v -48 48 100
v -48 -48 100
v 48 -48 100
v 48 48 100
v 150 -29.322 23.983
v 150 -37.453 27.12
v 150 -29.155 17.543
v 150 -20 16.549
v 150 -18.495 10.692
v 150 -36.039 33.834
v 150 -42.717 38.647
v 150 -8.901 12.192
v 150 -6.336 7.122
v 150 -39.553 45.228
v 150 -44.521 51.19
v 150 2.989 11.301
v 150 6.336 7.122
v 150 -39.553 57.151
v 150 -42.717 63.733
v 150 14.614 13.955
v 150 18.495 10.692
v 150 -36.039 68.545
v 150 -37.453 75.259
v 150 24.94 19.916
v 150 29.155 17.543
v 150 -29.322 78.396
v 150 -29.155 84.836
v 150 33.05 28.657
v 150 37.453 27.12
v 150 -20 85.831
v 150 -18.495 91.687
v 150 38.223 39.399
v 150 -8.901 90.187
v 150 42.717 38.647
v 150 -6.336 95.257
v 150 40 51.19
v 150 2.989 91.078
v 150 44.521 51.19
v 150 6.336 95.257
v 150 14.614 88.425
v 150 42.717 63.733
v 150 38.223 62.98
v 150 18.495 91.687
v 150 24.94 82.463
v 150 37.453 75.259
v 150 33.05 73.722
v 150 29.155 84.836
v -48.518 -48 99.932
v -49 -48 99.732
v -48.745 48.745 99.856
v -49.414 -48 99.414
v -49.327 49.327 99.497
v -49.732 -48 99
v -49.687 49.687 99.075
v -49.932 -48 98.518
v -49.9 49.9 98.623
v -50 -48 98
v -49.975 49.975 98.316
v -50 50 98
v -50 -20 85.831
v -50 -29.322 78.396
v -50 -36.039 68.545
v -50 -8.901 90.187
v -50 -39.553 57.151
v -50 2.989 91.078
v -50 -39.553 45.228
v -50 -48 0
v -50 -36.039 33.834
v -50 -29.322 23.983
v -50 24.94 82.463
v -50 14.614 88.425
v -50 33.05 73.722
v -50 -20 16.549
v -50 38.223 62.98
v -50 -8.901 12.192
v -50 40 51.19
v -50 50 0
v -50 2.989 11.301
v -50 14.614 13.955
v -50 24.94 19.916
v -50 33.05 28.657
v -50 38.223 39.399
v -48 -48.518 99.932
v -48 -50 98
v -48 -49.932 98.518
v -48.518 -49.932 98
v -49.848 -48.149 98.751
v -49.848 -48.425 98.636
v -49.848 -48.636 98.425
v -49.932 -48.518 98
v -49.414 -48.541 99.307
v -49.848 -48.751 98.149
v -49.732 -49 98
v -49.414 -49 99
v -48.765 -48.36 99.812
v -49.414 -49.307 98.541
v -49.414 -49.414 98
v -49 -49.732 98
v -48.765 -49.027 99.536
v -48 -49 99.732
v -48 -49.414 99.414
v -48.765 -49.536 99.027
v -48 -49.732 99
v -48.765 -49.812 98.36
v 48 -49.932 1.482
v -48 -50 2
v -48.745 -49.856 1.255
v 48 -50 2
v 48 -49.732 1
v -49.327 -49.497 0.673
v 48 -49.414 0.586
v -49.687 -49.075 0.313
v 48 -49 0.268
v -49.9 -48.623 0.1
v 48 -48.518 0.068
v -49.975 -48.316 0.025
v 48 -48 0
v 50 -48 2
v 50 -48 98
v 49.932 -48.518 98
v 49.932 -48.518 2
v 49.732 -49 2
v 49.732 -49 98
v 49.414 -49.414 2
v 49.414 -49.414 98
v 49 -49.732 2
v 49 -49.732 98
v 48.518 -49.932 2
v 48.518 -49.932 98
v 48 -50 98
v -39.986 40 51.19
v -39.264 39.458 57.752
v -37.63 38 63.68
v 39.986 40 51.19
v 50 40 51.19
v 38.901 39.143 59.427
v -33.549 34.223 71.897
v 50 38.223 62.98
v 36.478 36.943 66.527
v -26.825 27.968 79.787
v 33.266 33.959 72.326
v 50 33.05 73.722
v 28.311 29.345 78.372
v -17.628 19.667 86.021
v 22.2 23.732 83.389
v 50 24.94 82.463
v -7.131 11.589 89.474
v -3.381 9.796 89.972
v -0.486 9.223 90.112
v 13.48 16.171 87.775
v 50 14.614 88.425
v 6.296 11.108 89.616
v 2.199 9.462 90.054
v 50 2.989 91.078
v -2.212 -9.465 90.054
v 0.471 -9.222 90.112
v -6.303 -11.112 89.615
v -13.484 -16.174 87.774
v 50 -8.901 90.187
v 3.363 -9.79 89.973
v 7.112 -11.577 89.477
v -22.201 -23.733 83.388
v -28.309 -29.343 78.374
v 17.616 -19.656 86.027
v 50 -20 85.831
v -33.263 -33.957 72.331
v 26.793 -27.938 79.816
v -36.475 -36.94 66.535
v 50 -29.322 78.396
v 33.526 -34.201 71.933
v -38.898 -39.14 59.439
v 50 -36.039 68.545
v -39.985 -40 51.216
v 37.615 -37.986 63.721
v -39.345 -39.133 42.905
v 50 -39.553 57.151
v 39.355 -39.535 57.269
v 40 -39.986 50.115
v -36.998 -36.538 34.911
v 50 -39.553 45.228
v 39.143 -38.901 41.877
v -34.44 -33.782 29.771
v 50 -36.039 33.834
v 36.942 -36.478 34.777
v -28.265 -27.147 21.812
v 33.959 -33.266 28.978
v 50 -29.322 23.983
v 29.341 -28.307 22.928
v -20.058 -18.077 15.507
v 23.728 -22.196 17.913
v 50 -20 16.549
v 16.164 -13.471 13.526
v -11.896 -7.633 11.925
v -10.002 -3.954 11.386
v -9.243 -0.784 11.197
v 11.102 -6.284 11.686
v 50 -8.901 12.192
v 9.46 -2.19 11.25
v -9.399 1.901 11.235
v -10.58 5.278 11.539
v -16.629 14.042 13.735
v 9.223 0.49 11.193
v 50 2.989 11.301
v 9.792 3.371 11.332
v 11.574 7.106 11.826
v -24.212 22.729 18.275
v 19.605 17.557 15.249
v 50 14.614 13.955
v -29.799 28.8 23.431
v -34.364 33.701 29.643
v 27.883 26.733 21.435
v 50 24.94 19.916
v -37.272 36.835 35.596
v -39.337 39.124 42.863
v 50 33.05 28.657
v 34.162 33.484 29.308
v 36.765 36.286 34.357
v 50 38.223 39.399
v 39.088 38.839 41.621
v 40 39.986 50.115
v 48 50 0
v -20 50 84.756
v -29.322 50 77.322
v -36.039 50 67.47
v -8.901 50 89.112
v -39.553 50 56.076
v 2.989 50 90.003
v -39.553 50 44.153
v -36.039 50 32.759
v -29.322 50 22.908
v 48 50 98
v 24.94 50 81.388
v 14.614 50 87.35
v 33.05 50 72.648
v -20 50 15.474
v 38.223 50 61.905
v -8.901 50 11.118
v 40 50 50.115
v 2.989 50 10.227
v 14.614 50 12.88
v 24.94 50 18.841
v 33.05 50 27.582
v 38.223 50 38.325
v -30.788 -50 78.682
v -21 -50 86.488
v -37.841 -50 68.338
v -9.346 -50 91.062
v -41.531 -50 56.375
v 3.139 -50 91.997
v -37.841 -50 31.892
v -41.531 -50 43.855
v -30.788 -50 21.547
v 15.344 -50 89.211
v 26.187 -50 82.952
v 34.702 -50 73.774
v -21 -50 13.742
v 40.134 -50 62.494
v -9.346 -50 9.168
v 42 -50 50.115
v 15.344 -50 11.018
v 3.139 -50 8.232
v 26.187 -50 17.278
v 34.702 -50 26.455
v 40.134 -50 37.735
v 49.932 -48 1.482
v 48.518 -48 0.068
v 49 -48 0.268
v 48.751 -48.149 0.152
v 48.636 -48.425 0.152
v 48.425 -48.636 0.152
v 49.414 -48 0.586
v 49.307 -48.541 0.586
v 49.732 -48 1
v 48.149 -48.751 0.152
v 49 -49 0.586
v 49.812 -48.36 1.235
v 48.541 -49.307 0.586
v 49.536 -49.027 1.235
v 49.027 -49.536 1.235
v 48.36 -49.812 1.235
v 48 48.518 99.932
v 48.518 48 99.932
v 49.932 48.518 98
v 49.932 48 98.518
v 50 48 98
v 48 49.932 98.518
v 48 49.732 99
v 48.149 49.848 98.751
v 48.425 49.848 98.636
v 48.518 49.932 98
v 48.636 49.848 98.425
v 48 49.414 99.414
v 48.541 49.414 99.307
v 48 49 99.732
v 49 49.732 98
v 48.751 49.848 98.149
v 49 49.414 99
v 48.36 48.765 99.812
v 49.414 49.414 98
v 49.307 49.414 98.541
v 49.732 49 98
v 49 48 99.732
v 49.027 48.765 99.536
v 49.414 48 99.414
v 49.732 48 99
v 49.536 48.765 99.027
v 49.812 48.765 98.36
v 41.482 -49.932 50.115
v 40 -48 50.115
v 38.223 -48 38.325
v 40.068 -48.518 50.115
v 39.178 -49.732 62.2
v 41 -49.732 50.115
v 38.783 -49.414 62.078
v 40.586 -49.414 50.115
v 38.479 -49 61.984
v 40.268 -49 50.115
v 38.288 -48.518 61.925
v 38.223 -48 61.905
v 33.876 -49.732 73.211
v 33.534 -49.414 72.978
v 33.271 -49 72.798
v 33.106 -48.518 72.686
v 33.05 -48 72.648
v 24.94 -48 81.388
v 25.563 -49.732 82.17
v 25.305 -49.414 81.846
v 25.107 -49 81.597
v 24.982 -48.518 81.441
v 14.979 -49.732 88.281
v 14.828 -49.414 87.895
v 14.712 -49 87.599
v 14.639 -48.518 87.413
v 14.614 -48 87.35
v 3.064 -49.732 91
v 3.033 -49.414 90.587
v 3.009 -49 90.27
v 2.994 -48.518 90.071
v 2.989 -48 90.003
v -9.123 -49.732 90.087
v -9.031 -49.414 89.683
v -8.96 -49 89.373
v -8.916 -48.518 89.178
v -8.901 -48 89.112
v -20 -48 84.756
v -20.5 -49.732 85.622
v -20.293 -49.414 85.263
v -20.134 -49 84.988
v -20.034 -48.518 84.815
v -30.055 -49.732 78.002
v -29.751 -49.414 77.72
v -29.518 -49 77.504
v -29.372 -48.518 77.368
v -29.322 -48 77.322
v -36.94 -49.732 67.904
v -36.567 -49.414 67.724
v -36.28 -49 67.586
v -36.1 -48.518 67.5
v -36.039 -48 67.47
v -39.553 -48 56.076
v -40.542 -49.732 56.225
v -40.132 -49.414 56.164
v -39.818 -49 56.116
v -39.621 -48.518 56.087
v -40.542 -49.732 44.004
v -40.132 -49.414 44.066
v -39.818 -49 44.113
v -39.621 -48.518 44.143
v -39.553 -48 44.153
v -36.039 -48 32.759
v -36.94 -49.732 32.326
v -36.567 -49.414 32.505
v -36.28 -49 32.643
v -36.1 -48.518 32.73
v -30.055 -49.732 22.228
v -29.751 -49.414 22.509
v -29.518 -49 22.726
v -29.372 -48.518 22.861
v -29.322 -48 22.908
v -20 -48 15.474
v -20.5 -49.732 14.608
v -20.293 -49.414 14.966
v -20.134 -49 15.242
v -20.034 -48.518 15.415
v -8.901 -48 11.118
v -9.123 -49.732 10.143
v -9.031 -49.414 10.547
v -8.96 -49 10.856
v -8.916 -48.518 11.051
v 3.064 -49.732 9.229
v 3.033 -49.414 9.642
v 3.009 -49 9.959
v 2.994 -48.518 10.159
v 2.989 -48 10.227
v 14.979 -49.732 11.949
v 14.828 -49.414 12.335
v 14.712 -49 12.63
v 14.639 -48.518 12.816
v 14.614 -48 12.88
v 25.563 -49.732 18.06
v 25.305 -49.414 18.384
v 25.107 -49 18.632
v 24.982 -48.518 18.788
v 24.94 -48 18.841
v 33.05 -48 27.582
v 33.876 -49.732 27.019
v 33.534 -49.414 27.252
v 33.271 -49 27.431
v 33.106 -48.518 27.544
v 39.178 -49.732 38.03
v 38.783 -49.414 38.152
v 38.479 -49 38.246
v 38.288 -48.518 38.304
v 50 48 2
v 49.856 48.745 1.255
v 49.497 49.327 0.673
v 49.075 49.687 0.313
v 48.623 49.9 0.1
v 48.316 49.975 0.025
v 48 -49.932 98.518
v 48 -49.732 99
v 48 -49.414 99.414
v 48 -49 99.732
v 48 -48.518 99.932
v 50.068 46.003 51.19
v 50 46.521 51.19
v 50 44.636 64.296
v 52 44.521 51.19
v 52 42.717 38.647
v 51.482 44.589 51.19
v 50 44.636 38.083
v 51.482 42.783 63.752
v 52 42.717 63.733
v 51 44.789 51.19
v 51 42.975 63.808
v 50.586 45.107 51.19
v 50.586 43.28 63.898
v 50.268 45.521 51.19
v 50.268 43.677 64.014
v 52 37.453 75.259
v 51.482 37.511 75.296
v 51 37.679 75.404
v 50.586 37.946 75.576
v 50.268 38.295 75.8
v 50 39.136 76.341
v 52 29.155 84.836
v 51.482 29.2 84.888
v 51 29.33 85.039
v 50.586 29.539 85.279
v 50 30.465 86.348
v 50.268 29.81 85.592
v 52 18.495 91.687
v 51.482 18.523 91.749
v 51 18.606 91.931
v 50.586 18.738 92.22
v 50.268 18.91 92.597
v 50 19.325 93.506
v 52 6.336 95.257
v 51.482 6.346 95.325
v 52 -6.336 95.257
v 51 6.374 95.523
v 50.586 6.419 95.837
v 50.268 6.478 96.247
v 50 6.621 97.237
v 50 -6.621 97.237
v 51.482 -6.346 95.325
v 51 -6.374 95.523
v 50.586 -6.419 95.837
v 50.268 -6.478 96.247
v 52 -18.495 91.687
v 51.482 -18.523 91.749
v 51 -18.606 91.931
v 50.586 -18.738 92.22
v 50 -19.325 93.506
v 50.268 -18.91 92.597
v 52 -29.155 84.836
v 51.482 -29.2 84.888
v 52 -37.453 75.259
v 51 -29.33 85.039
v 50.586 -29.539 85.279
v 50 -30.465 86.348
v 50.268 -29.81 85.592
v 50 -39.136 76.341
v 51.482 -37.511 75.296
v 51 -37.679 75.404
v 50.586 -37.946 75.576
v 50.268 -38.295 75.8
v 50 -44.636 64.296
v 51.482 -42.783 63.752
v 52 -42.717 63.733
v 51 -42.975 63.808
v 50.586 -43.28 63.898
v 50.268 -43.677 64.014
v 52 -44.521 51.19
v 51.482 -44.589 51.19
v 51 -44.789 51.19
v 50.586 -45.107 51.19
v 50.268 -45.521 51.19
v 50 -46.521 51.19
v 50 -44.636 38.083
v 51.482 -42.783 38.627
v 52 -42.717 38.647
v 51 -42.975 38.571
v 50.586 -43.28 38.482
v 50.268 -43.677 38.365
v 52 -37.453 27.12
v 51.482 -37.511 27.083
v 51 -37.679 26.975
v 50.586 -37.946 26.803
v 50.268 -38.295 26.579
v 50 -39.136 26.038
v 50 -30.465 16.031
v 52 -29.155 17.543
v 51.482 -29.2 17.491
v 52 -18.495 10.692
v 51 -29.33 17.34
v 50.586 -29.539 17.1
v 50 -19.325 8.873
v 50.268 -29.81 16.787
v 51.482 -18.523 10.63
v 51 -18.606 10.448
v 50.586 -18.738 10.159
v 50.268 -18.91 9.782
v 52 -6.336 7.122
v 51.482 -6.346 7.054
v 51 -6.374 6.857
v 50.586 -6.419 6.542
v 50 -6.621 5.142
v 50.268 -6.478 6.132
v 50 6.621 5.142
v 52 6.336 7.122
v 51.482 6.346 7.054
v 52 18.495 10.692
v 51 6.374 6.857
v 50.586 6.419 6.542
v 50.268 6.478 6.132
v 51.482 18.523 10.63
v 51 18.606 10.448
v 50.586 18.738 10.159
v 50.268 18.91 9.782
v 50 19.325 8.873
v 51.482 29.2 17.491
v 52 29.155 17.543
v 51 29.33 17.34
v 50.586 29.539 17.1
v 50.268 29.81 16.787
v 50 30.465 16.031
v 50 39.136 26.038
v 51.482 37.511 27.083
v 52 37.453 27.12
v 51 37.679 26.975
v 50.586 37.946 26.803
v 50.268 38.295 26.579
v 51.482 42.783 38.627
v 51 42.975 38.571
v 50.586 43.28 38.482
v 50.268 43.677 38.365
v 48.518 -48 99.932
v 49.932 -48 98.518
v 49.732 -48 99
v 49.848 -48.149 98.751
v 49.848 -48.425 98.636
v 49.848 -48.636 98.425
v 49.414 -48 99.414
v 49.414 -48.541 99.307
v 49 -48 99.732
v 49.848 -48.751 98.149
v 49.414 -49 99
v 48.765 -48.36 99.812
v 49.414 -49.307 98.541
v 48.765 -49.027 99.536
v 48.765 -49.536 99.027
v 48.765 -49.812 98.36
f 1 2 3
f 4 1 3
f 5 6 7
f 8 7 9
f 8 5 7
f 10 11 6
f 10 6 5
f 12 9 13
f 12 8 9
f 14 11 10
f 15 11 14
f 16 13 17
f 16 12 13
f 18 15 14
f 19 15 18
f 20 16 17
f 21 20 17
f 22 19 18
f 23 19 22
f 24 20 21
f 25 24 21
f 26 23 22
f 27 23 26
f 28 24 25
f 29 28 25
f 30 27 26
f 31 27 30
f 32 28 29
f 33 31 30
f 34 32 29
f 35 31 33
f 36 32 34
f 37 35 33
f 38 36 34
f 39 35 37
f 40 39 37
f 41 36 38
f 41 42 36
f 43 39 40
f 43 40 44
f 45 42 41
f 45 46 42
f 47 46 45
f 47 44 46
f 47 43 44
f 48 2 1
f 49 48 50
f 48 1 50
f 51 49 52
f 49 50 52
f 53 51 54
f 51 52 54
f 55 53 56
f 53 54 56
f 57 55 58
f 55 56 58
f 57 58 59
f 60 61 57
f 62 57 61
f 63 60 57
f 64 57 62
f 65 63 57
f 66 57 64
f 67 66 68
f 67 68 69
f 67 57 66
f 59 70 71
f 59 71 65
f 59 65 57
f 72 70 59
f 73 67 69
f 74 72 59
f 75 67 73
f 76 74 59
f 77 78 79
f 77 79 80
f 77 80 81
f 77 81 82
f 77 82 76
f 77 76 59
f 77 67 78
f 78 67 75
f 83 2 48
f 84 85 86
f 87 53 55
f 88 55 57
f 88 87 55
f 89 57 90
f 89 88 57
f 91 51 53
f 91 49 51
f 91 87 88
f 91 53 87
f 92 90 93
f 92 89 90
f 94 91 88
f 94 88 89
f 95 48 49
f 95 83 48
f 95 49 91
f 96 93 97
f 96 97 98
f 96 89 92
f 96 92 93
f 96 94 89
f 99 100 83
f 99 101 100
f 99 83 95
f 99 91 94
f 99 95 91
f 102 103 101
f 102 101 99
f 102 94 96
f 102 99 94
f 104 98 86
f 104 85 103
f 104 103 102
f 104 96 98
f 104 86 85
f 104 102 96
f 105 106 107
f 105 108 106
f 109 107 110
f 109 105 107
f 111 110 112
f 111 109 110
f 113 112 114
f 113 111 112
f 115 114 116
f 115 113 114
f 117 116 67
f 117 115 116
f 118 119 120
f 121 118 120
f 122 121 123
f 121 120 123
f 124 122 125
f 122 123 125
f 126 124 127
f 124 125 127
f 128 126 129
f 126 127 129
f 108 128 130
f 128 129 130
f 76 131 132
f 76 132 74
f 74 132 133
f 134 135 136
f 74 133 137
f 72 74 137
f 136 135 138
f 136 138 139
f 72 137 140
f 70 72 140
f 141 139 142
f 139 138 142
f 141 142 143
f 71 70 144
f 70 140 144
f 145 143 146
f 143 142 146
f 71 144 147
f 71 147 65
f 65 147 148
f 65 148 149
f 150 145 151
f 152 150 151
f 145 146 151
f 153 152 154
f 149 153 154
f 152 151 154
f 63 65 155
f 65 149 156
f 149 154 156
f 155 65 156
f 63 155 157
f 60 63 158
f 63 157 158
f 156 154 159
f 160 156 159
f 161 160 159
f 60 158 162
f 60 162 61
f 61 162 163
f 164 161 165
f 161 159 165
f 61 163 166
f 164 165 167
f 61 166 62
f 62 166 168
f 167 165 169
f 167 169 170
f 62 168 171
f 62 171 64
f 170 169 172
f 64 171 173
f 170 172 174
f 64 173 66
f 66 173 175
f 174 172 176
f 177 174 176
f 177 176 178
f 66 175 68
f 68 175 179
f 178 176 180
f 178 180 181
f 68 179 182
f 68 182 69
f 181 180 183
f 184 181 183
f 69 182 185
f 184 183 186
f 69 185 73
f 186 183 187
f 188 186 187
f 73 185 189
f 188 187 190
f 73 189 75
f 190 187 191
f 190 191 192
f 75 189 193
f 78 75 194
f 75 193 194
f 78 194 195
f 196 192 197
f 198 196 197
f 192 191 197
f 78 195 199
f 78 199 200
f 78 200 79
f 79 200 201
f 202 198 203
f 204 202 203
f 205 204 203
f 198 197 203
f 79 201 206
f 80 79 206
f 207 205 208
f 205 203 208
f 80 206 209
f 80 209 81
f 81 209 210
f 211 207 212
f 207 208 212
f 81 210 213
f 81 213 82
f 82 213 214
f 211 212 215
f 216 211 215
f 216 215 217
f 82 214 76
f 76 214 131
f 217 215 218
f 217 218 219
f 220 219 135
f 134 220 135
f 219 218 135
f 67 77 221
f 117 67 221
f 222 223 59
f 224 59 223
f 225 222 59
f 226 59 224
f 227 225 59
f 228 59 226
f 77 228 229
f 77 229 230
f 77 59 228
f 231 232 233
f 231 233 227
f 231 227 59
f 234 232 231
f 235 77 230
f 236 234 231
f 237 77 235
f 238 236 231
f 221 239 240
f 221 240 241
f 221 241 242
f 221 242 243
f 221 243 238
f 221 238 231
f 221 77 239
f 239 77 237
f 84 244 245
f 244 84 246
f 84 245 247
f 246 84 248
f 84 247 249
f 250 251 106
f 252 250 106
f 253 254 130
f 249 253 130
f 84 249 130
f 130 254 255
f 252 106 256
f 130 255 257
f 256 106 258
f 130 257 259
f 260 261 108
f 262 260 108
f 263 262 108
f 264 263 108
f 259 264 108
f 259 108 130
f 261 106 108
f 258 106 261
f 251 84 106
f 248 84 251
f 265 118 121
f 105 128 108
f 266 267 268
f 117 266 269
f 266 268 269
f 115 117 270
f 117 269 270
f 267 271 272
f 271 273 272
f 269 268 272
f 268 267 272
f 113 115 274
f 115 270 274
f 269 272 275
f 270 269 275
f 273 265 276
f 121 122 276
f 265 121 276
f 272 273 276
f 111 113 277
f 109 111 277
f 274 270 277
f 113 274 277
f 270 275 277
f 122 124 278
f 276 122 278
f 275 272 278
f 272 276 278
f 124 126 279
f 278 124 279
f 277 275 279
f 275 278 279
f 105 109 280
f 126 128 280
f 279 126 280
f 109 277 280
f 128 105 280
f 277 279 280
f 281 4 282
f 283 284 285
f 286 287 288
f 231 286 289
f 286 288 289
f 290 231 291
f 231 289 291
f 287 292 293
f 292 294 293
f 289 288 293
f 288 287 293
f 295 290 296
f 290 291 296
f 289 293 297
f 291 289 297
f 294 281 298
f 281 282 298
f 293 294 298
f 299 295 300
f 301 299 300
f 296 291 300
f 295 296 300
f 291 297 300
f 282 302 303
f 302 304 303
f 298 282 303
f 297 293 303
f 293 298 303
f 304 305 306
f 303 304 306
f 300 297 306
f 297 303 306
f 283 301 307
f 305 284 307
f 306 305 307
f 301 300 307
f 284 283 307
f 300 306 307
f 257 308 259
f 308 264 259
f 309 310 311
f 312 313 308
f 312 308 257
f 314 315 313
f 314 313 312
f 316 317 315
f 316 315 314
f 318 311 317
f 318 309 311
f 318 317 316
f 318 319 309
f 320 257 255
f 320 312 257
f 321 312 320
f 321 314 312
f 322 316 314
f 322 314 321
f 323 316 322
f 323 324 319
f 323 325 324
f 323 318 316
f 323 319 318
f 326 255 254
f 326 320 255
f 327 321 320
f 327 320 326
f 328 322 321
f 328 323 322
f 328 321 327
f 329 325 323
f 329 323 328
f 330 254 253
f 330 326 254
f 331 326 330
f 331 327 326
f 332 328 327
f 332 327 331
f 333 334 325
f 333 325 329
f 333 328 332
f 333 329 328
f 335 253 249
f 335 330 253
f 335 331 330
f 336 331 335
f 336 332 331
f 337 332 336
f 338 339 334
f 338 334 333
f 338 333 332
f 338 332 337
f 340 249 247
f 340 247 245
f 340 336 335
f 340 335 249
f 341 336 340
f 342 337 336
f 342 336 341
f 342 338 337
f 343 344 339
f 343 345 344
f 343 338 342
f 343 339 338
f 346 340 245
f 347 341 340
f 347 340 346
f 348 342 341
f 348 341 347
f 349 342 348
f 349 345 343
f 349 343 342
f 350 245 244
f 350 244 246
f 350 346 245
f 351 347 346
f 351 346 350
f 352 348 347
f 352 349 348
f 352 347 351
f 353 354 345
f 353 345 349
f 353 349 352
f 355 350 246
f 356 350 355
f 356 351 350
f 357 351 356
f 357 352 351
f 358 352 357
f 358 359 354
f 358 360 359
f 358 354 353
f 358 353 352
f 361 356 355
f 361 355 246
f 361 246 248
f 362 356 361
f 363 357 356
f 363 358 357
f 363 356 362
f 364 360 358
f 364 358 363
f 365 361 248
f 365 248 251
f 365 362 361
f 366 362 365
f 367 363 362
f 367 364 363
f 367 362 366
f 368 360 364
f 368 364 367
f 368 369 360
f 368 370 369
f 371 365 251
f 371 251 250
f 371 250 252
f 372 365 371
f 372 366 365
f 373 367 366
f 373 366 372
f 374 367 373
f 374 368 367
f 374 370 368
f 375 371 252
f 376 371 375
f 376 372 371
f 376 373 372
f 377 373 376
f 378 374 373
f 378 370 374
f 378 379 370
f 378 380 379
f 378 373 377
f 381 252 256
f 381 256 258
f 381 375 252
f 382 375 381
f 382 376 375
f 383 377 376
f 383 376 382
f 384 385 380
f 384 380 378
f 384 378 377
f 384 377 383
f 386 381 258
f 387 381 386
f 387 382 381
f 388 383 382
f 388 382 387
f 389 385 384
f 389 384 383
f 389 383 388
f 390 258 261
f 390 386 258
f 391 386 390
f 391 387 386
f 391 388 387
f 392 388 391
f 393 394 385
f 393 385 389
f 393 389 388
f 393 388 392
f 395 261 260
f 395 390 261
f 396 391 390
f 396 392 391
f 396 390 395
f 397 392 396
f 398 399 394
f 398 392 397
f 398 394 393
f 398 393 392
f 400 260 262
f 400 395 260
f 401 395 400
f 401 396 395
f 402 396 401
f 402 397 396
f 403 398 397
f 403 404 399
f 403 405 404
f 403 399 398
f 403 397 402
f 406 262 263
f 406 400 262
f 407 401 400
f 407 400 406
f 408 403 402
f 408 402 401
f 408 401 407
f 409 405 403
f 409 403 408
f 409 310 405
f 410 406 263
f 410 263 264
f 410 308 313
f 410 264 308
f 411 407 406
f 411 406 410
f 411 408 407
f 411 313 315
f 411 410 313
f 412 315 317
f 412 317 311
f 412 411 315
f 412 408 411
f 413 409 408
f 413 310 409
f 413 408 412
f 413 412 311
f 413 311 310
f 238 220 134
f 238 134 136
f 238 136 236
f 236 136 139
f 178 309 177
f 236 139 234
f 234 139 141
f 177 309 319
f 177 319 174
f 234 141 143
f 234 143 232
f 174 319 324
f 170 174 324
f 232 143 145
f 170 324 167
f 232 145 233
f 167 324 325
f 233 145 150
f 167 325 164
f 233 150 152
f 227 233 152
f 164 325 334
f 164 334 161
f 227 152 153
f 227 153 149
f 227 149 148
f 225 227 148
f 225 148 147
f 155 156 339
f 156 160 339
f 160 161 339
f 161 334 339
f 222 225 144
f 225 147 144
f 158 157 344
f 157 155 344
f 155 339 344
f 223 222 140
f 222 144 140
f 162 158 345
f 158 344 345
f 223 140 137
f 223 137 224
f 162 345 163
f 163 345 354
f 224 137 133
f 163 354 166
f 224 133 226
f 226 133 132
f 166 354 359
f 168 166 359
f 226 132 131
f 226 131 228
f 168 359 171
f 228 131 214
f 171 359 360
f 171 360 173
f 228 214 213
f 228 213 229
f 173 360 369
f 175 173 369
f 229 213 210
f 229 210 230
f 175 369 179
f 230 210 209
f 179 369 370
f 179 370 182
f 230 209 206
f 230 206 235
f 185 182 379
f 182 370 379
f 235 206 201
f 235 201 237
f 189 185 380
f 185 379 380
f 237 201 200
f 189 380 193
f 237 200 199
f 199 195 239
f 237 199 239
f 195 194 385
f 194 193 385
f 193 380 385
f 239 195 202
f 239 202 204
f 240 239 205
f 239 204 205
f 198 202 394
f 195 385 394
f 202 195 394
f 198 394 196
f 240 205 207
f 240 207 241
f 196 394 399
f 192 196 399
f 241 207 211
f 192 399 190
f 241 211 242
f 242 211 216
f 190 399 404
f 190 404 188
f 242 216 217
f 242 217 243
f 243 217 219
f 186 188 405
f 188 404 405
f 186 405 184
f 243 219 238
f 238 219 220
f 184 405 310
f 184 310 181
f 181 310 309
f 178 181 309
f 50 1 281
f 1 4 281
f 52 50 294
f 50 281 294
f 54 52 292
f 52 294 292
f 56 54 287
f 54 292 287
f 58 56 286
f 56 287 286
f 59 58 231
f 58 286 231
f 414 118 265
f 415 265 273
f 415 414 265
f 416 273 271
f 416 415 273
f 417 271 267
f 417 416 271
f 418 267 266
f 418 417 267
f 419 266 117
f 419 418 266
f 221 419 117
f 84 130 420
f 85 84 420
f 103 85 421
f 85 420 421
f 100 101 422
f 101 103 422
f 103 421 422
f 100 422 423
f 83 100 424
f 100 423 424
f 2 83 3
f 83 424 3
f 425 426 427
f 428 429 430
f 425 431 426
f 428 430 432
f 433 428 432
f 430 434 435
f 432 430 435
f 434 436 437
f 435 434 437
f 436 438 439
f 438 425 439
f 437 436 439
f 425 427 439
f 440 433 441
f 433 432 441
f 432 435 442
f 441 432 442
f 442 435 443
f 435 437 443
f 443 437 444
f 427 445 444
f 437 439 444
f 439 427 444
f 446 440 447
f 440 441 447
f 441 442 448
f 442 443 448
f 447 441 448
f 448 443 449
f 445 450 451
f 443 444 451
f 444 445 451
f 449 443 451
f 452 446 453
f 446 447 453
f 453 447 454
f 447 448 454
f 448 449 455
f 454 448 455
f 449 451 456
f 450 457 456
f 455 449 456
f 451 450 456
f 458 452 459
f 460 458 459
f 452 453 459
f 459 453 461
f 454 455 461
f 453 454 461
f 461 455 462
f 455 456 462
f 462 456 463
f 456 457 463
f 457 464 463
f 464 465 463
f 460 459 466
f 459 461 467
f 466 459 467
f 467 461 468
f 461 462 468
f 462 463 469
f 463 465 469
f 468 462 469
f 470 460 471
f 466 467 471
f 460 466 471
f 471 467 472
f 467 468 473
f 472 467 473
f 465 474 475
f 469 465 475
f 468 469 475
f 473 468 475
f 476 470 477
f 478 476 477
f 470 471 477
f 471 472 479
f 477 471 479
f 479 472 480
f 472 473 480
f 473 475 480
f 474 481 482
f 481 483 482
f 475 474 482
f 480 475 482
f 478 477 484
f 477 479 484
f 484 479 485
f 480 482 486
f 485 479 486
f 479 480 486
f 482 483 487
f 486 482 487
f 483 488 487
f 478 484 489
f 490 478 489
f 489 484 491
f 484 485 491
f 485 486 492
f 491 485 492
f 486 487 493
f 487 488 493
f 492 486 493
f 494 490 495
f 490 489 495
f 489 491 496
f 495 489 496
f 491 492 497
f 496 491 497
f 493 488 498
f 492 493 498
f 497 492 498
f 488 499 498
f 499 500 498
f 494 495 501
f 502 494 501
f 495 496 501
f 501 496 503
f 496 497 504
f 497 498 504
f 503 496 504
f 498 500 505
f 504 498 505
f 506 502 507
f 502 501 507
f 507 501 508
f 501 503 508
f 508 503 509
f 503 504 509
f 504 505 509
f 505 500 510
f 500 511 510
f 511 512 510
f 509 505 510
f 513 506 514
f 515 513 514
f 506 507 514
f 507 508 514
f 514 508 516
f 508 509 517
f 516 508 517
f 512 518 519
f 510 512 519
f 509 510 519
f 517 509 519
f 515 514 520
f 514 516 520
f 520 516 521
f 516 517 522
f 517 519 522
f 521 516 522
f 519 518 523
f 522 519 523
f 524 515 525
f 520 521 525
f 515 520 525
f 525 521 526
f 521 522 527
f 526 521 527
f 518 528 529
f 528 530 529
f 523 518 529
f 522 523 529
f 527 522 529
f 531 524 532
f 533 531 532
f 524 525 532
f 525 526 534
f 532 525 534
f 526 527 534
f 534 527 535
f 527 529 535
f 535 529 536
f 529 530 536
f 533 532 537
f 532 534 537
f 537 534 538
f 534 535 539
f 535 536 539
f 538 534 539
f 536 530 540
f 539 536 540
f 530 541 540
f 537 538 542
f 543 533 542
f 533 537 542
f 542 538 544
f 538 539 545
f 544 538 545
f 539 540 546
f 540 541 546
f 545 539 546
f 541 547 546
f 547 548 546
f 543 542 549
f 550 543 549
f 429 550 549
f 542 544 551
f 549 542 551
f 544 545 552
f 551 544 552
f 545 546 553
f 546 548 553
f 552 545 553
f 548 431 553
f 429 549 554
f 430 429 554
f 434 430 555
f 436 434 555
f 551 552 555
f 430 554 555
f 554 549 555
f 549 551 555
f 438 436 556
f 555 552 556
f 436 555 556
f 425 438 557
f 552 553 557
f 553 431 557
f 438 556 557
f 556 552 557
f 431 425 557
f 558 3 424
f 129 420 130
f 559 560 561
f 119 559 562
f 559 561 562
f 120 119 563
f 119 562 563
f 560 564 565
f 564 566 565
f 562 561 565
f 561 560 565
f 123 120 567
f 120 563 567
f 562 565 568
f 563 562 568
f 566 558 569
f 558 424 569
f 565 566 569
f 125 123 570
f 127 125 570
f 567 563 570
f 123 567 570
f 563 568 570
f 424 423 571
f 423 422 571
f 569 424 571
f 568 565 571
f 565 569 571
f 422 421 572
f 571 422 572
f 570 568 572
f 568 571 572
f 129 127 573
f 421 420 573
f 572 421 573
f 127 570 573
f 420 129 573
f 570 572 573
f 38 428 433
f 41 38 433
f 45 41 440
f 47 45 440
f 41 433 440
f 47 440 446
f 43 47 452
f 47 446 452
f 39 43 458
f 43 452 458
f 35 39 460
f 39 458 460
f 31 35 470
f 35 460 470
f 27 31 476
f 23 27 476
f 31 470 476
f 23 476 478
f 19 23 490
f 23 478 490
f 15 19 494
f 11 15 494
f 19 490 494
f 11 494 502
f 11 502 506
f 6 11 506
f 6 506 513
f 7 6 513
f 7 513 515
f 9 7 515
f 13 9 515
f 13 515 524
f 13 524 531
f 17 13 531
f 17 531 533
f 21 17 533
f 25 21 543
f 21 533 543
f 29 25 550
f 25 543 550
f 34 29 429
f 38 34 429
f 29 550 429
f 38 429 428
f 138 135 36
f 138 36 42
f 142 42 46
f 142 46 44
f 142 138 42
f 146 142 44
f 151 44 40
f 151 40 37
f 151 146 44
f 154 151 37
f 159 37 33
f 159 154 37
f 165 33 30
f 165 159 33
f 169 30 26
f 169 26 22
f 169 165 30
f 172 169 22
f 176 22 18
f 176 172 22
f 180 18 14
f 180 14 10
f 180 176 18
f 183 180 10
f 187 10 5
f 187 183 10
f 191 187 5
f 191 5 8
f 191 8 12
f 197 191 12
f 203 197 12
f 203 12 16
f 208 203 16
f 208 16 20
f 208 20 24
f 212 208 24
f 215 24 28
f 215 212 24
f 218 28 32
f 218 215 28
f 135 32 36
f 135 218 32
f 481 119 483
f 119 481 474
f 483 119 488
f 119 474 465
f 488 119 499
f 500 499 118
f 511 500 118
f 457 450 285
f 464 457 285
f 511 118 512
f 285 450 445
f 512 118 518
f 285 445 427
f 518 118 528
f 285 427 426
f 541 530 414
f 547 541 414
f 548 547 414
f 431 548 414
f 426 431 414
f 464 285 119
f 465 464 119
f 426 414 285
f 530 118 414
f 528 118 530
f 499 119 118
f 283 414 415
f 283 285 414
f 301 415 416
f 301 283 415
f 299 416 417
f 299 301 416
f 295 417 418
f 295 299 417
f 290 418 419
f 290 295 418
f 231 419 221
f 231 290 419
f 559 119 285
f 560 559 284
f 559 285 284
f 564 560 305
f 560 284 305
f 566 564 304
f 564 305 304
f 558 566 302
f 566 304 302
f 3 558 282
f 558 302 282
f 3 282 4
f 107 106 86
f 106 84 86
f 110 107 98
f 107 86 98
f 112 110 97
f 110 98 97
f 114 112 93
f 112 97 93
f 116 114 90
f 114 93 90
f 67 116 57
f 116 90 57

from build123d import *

# Parameters (mm, degrees)
F0_W     = 100
F0_H     = 100
F1_DEPTH = 100
F2_R     = 40
F3_DEPTH = 100.001
F4_R     = 40
F5_DEPTH = 100.001
F2_R_2   = 44.5208759626
F6_DEPTH = 100
F7_R     = 2


with BuildPart() as f1:
    # F0 (on Top) → F1 (new body)
    with BuildSketch(Plane.XY):
        Rectangle(F0_W, F0_H)
    extrude(amount=F1_DEPTH)

    # F2 (on face) → F3 (cut, through all)
    with BuildSketch(Plane.YZ.offset(50)):
        with Locations((0, 51.1895758084)):
            Circle(F2_R)
    extrude(amount=-F3_DEPTH, mode=Mode.SUBTRACT)

    # F4 (on face) → F5 (cut, through all)
    with BuildSketch(Plane.XZ.offset(50)):
        with Locations((0, 50.114749205)):
            Circle(F4_R)
    extrude(amount=-F5_DEPTH, mode=Mode.SUBTRACT)

    # F2 (on face) → F6 (join)
    with BuildSketch(Plane.YZ.offset(50)):
        with Locations((0, 51.1895758084)):
            Circle(F2_R_2)
        with Locations((0, 51.1895758084)):
            Circle(F2_R, mode=Mode.SUBTRACT)
    extrude(amount=F6_DEPTH)

    # F7
    f7_edges = [f1.edges().sort_by_distance(p)[0] for p in [
        (0, -50, 100),
        (50, 0, 100),
        (0, 50, 100),
        (-50, 0, 100),
        (50, -50, 50),
        (50, 0, 0),
        (50, 50, 50),
        (50, -44.520876, 51.189576),
        (-50, -50, 50),
        (0, -50, 0),
        (-40, -50, 50.114749),
    ]]
    fillet(f7_edges, radius=F7_R)


solid = f1.part
